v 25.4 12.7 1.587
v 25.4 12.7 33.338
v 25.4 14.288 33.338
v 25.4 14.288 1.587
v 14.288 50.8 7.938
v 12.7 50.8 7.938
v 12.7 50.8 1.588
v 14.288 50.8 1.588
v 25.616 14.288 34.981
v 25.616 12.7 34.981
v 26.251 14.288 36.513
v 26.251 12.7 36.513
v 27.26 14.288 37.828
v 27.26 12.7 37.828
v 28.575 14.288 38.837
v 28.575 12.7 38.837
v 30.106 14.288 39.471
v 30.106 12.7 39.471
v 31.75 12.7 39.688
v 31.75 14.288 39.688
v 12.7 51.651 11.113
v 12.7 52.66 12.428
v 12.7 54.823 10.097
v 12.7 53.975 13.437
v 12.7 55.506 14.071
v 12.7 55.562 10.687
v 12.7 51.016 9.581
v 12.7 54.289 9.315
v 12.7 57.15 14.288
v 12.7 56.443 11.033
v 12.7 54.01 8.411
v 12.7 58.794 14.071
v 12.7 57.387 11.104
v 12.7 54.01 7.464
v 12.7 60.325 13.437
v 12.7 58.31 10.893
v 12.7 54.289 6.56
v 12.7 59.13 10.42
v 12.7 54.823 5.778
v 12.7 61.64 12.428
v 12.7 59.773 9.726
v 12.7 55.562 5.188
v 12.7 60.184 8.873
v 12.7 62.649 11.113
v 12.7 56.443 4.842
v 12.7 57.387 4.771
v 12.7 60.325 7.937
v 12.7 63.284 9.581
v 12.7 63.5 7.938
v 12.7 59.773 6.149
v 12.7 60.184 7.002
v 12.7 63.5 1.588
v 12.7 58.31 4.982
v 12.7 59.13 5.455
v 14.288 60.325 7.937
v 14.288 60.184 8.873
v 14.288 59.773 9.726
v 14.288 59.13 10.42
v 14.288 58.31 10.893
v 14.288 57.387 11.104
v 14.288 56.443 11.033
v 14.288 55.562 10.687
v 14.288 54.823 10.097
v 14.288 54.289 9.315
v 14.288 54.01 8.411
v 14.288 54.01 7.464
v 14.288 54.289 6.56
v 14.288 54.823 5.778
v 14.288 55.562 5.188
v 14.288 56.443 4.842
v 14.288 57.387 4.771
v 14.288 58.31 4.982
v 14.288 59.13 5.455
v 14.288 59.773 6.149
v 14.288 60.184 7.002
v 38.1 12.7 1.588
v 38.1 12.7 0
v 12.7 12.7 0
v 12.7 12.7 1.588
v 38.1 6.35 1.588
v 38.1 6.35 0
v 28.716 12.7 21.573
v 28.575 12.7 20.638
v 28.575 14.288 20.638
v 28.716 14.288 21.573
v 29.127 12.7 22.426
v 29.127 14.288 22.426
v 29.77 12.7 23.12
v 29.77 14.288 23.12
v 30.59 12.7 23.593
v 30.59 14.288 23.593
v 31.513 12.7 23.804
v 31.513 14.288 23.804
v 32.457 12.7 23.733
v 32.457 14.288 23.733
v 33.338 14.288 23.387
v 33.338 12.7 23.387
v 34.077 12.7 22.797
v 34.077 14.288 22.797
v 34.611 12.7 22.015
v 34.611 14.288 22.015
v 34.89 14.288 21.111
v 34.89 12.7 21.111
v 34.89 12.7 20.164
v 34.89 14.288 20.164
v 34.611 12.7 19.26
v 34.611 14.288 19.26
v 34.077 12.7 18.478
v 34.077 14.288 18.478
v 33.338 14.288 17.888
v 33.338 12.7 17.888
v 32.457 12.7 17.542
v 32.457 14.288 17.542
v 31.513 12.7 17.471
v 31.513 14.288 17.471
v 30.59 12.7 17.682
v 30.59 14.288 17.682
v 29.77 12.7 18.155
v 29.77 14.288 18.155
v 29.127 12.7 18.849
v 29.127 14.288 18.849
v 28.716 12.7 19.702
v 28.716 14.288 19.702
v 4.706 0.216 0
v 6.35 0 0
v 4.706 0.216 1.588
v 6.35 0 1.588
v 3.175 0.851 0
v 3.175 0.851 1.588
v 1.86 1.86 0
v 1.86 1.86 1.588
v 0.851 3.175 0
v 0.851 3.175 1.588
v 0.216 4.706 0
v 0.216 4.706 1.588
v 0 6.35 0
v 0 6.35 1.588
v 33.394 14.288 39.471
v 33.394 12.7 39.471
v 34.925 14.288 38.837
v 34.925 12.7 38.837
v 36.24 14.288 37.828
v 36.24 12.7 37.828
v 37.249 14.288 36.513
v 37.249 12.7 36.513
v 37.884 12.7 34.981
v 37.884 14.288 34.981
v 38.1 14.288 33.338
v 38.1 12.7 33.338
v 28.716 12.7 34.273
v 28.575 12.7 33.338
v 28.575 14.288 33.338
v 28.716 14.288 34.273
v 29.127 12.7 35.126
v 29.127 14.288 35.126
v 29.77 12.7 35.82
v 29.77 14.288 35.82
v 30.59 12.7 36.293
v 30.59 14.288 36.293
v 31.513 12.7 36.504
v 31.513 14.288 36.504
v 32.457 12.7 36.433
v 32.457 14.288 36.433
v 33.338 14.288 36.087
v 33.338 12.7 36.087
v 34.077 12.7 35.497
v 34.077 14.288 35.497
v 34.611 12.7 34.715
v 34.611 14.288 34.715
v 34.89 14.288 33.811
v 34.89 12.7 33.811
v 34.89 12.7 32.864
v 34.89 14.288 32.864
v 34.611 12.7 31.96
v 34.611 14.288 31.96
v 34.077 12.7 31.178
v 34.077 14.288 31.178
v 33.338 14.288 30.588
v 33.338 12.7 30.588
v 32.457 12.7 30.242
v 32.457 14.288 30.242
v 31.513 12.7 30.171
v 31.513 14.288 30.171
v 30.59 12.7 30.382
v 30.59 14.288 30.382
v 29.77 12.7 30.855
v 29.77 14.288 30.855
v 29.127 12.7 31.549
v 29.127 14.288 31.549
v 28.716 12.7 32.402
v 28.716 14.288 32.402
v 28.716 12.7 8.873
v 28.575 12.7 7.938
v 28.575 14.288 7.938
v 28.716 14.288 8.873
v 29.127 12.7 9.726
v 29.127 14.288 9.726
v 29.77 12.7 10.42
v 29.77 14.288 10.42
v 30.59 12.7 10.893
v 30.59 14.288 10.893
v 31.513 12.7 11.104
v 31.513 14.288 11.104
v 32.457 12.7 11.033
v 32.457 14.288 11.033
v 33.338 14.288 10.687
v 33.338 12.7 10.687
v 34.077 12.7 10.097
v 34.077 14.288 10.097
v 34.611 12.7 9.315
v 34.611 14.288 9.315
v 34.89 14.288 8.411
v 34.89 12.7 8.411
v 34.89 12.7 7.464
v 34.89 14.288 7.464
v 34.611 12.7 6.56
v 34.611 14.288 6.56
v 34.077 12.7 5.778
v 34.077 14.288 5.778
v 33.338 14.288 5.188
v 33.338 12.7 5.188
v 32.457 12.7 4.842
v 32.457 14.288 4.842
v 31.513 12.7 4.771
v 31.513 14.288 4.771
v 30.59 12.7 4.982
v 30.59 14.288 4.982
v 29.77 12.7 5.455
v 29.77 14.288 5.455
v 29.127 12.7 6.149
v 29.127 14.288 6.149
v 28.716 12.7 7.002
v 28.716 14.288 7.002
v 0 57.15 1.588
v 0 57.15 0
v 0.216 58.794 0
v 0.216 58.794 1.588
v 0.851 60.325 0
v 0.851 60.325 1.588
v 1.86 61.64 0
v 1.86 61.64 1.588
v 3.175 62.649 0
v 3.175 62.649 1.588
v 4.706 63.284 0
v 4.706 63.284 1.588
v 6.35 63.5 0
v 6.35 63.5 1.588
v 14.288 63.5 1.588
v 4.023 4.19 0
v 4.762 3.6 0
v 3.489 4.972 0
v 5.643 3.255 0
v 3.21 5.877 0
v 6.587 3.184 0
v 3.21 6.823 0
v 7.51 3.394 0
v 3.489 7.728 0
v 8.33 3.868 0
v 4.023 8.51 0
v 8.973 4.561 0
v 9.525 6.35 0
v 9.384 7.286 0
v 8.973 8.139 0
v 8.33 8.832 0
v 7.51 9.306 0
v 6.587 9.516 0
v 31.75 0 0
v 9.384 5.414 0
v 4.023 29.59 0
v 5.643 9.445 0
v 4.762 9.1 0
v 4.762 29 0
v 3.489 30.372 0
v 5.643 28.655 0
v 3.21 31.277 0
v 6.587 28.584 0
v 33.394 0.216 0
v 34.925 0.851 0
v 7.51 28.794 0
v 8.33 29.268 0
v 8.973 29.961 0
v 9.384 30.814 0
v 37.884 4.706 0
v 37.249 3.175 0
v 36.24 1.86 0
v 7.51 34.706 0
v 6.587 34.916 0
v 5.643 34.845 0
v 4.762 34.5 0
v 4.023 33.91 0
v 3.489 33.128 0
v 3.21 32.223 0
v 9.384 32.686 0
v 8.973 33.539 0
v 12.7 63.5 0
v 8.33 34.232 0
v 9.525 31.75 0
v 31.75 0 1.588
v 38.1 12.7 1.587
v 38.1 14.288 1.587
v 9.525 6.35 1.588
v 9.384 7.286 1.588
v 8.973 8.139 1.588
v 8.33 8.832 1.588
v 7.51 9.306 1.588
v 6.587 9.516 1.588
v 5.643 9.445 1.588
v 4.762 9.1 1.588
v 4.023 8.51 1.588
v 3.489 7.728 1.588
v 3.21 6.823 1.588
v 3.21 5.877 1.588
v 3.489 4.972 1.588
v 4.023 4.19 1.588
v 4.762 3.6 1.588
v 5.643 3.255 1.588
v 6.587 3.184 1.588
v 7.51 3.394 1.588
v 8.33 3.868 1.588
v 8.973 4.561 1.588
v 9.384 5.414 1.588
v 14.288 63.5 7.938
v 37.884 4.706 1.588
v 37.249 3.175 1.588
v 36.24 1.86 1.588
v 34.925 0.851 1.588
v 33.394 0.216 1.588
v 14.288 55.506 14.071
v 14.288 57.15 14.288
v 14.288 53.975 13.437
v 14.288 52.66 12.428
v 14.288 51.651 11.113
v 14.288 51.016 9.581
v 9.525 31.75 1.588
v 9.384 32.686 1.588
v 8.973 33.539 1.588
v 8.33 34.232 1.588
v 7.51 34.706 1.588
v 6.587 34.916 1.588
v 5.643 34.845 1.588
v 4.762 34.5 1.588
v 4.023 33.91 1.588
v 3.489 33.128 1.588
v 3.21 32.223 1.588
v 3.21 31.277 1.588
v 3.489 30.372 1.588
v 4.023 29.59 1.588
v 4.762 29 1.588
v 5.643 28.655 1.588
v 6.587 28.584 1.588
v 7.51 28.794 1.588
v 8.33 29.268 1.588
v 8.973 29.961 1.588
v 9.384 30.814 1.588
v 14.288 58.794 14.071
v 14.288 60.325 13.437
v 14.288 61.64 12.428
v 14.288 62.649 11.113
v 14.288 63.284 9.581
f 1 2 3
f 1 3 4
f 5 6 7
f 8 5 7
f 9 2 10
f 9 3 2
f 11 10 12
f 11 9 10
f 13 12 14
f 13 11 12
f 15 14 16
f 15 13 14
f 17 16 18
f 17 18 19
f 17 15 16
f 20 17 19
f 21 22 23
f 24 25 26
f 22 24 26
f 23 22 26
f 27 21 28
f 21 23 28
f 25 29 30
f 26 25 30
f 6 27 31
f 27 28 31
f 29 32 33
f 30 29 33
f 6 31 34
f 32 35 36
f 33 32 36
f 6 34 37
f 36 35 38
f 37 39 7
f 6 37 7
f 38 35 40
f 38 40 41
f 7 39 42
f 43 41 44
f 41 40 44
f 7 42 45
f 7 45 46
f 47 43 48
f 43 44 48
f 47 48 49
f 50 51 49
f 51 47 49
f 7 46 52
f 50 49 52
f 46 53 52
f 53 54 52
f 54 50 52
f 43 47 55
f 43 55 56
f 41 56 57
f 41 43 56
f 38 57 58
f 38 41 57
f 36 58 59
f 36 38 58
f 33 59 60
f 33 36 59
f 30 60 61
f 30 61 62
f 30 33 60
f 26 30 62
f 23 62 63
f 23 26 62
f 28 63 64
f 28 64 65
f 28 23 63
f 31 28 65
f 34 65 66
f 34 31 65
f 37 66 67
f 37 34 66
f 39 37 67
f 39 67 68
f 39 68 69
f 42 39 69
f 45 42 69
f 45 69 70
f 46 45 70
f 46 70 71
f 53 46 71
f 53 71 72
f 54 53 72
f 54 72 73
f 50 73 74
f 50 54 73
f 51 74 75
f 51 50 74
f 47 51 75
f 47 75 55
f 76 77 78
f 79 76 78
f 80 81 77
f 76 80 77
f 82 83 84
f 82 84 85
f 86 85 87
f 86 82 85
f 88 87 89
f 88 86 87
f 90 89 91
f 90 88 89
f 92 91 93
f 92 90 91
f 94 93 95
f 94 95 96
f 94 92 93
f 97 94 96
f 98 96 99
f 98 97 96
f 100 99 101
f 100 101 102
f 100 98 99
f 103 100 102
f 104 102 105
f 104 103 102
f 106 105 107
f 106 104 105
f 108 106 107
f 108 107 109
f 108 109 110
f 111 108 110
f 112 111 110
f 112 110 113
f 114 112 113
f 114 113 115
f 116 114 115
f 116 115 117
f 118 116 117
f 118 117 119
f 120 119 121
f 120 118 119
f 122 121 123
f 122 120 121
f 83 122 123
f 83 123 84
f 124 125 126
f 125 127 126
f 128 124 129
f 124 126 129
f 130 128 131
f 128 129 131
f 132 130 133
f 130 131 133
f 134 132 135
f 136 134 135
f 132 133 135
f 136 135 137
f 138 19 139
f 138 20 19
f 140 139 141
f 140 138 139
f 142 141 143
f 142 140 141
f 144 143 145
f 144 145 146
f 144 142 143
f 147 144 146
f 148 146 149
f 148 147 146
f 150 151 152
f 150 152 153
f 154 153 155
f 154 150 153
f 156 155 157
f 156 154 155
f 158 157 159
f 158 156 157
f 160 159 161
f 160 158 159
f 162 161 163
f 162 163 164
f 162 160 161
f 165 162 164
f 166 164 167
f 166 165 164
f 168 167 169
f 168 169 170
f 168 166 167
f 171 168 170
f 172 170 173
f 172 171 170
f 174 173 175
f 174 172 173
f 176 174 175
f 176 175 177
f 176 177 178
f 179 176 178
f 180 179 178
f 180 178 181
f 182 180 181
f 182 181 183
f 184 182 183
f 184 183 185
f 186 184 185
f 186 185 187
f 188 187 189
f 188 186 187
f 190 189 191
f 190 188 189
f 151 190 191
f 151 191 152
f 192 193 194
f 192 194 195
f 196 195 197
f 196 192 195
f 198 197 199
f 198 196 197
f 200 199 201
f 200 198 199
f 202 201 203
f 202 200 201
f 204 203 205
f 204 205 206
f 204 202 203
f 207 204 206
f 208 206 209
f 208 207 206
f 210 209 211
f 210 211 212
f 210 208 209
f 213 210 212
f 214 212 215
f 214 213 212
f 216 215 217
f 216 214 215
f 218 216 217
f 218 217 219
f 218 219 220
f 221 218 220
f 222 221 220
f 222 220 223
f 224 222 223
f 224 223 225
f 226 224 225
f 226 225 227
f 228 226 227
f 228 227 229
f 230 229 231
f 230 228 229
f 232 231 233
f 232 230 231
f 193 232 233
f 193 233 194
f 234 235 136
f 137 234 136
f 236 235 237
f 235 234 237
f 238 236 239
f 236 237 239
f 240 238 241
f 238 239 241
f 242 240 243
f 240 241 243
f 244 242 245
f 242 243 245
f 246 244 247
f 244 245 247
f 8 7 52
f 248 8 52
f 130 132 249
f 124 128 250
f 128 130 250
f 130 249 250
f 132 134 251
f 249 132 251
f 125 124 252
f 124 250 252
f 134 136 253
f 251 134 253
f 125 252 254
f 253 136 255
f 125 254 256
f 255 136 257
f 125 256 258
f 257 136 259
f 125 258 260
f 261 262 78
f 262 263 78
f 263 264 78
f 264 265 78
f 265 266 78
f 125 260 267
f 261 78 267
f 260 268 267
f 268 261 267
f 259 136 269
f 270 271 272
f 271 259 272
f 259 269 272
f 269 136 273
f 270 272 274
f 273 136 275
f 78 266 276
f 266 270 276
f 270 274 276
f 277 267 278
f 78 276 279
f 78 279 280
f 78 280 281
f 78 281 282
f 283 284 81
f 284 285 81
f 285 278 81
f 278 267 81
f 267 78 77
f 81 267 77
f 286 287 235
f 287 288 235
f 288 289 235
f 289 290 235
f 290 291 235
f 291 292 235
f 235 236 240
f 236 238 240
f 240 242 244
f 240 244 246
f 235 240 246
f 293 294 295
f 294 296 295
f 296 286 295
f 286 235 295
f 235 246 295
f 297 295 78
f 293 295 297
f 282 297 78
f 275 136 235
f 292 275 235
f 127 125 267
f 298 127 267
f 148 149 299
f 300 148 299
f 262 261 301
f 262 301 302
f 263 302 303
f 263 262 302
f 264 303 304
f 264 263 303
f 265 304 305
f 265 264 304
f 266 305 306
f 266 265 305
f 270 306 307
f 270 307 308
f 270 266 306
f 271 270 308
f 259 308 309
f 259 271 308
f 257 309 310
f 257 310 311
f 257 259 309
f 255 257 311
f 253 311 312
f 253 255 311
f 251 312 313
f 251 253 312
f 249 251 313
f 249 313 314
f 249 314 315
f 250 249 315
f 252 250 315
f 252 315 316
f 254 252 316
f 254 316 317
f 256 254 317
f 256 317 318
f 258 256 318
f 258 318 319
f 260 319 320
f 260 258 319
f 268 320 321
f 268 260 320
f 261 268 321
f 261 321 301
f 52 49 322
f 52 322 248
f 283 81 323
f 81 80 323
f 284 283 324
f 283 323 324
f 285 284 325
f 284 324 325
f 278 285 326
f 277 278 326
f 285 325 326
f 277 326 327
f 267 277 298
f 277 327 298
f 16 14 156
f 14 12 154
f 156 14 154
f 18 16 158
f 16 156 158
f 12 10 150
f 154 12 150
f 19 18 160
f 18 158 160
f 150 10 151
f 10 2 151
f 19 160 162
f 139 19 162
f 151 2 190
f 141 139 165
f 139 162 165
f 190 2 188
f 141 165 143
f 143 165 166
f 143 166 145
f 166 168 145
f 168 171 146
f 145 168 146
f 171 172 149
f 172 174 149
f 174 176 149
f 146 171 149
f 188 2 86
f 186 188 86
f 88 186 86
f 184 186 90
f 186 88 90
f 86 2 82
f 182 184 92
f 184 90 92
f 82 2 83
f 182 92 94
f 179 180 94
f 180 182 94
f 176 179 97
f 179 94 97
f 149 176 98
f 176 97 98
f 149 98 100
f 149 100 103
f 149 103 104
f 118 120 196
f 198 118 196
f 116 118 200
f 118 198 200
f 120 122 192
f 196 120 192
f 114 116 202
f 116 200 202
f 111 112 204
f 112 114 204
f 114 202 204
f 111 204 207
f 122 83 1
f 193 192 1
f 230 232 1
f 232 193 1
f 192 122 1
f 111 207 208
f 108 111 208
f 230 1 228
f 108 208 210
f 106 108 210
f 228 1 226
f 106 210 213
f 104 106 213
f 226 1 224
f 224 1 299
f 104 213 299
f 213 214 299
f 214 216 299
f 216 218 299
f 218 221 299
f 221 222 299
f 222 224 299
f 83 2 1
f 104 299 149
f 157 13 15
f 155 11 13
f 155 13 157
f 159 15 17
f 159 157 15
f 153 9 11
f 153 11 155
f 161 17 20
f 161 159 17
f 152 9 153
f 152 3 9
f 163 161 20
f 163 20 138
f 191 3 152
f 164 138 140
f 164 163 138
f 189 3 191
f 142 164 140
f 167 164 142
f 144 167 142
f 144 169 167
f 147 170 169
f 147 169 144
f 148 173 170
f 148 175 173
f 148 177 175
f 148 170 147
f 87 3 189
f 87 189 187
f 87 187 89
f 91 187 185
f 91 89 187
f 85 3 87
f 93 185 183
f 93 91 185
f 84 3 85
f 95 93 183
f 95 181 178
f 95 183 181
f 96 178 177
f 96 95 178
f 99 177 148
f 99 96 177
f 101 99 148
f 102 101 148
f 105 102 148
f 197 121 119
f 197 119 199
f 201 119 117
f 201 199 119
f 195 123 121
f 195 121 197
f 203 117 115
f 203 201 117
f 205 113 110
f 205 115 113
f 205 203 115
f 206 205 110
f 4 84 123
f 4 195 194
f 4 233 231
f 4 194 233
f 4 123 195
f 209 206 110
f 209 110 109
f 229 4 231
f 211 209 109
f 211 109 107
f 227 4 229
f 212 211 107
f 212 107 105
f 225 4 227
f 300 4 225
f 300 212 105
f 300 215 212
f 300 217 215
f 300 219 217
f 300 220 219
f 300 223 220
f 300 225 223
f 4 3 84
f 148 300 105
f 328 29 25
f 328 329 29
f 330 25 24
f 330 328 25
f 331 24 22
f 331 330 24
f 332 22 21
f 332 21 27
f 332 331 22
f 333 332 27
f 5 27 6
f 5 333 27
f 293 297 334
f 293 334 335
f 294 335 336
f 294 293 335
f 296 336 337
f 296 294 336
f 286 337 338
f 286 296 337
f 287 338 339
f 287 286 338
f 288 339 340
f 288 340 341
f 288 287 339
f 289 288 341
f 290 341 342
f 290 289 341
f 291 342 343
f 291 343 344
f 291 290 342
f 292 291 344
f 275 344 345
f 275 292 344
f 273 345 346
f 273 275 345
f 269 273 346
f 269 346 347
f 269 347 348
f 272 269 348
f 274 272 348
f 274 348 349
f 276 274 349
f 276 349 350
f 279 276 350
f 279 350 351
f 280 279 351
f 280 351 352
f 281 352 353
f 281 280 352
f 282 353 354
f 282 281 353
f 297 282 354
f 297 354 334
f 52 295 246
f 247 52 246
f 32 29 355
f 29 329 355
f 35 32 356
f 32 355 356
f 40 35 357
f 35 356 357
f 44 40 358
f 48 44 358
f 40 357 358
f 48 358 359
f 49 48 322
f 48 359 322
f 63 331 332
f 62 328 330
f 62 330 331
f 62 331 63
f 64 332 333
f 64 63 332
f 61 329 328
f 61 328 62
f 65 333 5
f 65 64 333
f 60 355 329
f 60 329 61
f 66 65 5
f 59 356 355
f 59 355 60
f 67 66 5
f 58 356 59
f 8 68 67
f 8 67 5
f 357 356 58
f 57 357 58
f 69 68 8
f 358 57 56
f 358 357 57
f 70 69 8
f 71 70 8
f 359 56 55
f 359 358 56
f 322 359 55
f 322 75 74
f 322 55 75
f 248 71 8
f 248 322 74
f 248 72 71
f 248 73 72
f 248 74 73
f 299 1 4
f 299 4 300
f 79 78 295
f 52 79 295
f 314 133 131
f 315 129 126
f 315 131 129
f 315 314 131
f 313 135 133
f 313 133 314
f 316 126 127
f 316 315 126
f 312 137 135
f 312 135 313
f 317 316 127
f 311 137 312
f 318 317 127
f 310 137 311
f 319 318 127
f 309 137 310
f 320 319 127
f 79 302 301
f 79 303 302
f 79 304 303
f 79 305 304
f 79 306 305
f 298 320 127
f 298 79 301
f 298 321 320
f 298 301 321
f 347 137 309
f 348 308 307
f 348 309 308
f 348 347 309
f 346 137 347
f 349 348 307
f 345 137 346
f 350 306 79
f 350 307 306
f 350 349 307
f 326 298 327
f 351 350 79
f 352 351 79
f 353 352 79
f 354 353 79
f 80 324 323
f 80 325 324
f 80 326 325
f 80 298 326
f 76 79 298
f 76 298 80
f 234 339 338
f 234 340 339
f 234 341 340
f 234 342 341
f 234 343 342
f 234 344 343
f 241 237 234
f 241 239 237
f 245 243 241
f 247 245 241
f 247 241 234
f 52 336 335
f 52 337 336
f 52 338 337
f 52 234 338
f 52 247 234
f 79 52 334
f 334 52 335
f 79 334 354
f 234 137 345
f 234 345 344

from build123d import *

# Parameters (mm, degrees)
SKETCH1_R           = 3.175
BOSS_EXTRUDE1_DEPTH = 1.5875
SKETCH2_W           = 12.7
SKETCH2_H           = 12.7
SKETCH2_R           = 3.175
BOSS_EXTRUDE2_DEPTH = 1.5875
SKETCH3_W           = 12.7
SKETCH3_H           = 38.1
SKETCH3_R           = 3.175
BOSS_EXTRUDE3_DEPTH = 1.5875
FILLET1_R           = 6.35
FILLET2_R           = 6.35
FILLET3_R           = 6.35


with BuildPart() as part:
    # Sketch1 → Boss-Extrude1 (new body)
    with BuildSketch(Plane.XY):
        Polygon((12.7, 0), (38.1, 0), (38.1, 12.7), (12.7, 12.7), (12.7, 63.5), (0, 63.5), (0, 0), align=None)
        with Locations((6.35, 31.75)):
            Circle(SKETCH1_R, mode=Mode.SUBTRACT)
        with Locations((6.35, 6.35)):
            Circle(SKETCH1_R, mode=Mode.SUBTRACT)
    extrude(amount=BOSS_EXTRUDE1_DEPTH)

    # Fillet3
    fillet3_edges = [part.edges().sort_by_distance(p)[0] for p in [
        (0, 0, 0.79375),
        (0, 63.5, 0.79375),
        (38.1, 0, 0.79375),
    ]]
    fillet(fillet3_edges, radius=FILLET3_R)


with BuildPart() as body_2:
    # Sketch2 → Boss-Extrude2 (new body)
    with BuildSketch(Plane(origin=(12.7, 0, 0), x_dir=(0, 0, -1), z_dir=(1, 0, 0))):
        with Locations((-7.9375, 57.15)):
            Rectangle(SKETCH2_W, SKETCH2_H)
        with Locations(Location((-7.9375, 57.15, 0), (0, 0, 90))):
            Circle(SKETCH2_R, mode=Mode.SUBTRACT)
    extrude(amount=BOSS_EXTRUDE2_DEPTH)

    # Fillet2
    fillet2_edges = [body_2.edges().sort_by_distance(p)[0] for p in [
        (13.49375, 50.8, 14.2875),
        (13.49375, 63.5, 14.2875),
    ]]
    fillet(fillet2_edges, radius=FILLET2_R - 0.0001)  # a hair under: the kernel refuses the full size


with BuildPart() as body_3:
    # Sketch3 → Boss-Extrude3 (new body)
    with BuildSketch(Plane(origin=(0, 12.7, 0), x_dir=(1, 0, 0), z_dir=(0, 1, 0))):
        with Locations((31.75, -20.6375)):
            Rectangle(SKETCH3_W, SKETCH3_H)
        with Locations(Location((31.75, -7.9375, 0), (0, 0, 180))):
            Circle(SKETCH3_R, mode=Mode.SUBTRACT)
        with Locations(Location((31.75, -20.6375, 0), (0, 0, 180))):
            Circle(SKETCH3_R, mode=Mode.SUBTRACT)
        with Locations(Location((31.75, -33.3375, 0), (0, 0, 180))):
            Circle(SKETCH3_R, mode=Mode.SUBTRACT)
    extrude(amount=BOSS_EXTRUDE3_DEPTH)

    # Fillet1
    fillet1_edges = [body_3.edges().sort_by_distance(p)[0] for p in [
        (25.4, 13.49375, 39.6875),
        (38.1, 13.49375, 39.6875),
    ]]
    fillet(fillet1_edges, radius=FILLET1_R - 0.0001)  # a hair under: the kernel refuses the full size


solid = Compound([part.part, body_2.part, body_3.part])
